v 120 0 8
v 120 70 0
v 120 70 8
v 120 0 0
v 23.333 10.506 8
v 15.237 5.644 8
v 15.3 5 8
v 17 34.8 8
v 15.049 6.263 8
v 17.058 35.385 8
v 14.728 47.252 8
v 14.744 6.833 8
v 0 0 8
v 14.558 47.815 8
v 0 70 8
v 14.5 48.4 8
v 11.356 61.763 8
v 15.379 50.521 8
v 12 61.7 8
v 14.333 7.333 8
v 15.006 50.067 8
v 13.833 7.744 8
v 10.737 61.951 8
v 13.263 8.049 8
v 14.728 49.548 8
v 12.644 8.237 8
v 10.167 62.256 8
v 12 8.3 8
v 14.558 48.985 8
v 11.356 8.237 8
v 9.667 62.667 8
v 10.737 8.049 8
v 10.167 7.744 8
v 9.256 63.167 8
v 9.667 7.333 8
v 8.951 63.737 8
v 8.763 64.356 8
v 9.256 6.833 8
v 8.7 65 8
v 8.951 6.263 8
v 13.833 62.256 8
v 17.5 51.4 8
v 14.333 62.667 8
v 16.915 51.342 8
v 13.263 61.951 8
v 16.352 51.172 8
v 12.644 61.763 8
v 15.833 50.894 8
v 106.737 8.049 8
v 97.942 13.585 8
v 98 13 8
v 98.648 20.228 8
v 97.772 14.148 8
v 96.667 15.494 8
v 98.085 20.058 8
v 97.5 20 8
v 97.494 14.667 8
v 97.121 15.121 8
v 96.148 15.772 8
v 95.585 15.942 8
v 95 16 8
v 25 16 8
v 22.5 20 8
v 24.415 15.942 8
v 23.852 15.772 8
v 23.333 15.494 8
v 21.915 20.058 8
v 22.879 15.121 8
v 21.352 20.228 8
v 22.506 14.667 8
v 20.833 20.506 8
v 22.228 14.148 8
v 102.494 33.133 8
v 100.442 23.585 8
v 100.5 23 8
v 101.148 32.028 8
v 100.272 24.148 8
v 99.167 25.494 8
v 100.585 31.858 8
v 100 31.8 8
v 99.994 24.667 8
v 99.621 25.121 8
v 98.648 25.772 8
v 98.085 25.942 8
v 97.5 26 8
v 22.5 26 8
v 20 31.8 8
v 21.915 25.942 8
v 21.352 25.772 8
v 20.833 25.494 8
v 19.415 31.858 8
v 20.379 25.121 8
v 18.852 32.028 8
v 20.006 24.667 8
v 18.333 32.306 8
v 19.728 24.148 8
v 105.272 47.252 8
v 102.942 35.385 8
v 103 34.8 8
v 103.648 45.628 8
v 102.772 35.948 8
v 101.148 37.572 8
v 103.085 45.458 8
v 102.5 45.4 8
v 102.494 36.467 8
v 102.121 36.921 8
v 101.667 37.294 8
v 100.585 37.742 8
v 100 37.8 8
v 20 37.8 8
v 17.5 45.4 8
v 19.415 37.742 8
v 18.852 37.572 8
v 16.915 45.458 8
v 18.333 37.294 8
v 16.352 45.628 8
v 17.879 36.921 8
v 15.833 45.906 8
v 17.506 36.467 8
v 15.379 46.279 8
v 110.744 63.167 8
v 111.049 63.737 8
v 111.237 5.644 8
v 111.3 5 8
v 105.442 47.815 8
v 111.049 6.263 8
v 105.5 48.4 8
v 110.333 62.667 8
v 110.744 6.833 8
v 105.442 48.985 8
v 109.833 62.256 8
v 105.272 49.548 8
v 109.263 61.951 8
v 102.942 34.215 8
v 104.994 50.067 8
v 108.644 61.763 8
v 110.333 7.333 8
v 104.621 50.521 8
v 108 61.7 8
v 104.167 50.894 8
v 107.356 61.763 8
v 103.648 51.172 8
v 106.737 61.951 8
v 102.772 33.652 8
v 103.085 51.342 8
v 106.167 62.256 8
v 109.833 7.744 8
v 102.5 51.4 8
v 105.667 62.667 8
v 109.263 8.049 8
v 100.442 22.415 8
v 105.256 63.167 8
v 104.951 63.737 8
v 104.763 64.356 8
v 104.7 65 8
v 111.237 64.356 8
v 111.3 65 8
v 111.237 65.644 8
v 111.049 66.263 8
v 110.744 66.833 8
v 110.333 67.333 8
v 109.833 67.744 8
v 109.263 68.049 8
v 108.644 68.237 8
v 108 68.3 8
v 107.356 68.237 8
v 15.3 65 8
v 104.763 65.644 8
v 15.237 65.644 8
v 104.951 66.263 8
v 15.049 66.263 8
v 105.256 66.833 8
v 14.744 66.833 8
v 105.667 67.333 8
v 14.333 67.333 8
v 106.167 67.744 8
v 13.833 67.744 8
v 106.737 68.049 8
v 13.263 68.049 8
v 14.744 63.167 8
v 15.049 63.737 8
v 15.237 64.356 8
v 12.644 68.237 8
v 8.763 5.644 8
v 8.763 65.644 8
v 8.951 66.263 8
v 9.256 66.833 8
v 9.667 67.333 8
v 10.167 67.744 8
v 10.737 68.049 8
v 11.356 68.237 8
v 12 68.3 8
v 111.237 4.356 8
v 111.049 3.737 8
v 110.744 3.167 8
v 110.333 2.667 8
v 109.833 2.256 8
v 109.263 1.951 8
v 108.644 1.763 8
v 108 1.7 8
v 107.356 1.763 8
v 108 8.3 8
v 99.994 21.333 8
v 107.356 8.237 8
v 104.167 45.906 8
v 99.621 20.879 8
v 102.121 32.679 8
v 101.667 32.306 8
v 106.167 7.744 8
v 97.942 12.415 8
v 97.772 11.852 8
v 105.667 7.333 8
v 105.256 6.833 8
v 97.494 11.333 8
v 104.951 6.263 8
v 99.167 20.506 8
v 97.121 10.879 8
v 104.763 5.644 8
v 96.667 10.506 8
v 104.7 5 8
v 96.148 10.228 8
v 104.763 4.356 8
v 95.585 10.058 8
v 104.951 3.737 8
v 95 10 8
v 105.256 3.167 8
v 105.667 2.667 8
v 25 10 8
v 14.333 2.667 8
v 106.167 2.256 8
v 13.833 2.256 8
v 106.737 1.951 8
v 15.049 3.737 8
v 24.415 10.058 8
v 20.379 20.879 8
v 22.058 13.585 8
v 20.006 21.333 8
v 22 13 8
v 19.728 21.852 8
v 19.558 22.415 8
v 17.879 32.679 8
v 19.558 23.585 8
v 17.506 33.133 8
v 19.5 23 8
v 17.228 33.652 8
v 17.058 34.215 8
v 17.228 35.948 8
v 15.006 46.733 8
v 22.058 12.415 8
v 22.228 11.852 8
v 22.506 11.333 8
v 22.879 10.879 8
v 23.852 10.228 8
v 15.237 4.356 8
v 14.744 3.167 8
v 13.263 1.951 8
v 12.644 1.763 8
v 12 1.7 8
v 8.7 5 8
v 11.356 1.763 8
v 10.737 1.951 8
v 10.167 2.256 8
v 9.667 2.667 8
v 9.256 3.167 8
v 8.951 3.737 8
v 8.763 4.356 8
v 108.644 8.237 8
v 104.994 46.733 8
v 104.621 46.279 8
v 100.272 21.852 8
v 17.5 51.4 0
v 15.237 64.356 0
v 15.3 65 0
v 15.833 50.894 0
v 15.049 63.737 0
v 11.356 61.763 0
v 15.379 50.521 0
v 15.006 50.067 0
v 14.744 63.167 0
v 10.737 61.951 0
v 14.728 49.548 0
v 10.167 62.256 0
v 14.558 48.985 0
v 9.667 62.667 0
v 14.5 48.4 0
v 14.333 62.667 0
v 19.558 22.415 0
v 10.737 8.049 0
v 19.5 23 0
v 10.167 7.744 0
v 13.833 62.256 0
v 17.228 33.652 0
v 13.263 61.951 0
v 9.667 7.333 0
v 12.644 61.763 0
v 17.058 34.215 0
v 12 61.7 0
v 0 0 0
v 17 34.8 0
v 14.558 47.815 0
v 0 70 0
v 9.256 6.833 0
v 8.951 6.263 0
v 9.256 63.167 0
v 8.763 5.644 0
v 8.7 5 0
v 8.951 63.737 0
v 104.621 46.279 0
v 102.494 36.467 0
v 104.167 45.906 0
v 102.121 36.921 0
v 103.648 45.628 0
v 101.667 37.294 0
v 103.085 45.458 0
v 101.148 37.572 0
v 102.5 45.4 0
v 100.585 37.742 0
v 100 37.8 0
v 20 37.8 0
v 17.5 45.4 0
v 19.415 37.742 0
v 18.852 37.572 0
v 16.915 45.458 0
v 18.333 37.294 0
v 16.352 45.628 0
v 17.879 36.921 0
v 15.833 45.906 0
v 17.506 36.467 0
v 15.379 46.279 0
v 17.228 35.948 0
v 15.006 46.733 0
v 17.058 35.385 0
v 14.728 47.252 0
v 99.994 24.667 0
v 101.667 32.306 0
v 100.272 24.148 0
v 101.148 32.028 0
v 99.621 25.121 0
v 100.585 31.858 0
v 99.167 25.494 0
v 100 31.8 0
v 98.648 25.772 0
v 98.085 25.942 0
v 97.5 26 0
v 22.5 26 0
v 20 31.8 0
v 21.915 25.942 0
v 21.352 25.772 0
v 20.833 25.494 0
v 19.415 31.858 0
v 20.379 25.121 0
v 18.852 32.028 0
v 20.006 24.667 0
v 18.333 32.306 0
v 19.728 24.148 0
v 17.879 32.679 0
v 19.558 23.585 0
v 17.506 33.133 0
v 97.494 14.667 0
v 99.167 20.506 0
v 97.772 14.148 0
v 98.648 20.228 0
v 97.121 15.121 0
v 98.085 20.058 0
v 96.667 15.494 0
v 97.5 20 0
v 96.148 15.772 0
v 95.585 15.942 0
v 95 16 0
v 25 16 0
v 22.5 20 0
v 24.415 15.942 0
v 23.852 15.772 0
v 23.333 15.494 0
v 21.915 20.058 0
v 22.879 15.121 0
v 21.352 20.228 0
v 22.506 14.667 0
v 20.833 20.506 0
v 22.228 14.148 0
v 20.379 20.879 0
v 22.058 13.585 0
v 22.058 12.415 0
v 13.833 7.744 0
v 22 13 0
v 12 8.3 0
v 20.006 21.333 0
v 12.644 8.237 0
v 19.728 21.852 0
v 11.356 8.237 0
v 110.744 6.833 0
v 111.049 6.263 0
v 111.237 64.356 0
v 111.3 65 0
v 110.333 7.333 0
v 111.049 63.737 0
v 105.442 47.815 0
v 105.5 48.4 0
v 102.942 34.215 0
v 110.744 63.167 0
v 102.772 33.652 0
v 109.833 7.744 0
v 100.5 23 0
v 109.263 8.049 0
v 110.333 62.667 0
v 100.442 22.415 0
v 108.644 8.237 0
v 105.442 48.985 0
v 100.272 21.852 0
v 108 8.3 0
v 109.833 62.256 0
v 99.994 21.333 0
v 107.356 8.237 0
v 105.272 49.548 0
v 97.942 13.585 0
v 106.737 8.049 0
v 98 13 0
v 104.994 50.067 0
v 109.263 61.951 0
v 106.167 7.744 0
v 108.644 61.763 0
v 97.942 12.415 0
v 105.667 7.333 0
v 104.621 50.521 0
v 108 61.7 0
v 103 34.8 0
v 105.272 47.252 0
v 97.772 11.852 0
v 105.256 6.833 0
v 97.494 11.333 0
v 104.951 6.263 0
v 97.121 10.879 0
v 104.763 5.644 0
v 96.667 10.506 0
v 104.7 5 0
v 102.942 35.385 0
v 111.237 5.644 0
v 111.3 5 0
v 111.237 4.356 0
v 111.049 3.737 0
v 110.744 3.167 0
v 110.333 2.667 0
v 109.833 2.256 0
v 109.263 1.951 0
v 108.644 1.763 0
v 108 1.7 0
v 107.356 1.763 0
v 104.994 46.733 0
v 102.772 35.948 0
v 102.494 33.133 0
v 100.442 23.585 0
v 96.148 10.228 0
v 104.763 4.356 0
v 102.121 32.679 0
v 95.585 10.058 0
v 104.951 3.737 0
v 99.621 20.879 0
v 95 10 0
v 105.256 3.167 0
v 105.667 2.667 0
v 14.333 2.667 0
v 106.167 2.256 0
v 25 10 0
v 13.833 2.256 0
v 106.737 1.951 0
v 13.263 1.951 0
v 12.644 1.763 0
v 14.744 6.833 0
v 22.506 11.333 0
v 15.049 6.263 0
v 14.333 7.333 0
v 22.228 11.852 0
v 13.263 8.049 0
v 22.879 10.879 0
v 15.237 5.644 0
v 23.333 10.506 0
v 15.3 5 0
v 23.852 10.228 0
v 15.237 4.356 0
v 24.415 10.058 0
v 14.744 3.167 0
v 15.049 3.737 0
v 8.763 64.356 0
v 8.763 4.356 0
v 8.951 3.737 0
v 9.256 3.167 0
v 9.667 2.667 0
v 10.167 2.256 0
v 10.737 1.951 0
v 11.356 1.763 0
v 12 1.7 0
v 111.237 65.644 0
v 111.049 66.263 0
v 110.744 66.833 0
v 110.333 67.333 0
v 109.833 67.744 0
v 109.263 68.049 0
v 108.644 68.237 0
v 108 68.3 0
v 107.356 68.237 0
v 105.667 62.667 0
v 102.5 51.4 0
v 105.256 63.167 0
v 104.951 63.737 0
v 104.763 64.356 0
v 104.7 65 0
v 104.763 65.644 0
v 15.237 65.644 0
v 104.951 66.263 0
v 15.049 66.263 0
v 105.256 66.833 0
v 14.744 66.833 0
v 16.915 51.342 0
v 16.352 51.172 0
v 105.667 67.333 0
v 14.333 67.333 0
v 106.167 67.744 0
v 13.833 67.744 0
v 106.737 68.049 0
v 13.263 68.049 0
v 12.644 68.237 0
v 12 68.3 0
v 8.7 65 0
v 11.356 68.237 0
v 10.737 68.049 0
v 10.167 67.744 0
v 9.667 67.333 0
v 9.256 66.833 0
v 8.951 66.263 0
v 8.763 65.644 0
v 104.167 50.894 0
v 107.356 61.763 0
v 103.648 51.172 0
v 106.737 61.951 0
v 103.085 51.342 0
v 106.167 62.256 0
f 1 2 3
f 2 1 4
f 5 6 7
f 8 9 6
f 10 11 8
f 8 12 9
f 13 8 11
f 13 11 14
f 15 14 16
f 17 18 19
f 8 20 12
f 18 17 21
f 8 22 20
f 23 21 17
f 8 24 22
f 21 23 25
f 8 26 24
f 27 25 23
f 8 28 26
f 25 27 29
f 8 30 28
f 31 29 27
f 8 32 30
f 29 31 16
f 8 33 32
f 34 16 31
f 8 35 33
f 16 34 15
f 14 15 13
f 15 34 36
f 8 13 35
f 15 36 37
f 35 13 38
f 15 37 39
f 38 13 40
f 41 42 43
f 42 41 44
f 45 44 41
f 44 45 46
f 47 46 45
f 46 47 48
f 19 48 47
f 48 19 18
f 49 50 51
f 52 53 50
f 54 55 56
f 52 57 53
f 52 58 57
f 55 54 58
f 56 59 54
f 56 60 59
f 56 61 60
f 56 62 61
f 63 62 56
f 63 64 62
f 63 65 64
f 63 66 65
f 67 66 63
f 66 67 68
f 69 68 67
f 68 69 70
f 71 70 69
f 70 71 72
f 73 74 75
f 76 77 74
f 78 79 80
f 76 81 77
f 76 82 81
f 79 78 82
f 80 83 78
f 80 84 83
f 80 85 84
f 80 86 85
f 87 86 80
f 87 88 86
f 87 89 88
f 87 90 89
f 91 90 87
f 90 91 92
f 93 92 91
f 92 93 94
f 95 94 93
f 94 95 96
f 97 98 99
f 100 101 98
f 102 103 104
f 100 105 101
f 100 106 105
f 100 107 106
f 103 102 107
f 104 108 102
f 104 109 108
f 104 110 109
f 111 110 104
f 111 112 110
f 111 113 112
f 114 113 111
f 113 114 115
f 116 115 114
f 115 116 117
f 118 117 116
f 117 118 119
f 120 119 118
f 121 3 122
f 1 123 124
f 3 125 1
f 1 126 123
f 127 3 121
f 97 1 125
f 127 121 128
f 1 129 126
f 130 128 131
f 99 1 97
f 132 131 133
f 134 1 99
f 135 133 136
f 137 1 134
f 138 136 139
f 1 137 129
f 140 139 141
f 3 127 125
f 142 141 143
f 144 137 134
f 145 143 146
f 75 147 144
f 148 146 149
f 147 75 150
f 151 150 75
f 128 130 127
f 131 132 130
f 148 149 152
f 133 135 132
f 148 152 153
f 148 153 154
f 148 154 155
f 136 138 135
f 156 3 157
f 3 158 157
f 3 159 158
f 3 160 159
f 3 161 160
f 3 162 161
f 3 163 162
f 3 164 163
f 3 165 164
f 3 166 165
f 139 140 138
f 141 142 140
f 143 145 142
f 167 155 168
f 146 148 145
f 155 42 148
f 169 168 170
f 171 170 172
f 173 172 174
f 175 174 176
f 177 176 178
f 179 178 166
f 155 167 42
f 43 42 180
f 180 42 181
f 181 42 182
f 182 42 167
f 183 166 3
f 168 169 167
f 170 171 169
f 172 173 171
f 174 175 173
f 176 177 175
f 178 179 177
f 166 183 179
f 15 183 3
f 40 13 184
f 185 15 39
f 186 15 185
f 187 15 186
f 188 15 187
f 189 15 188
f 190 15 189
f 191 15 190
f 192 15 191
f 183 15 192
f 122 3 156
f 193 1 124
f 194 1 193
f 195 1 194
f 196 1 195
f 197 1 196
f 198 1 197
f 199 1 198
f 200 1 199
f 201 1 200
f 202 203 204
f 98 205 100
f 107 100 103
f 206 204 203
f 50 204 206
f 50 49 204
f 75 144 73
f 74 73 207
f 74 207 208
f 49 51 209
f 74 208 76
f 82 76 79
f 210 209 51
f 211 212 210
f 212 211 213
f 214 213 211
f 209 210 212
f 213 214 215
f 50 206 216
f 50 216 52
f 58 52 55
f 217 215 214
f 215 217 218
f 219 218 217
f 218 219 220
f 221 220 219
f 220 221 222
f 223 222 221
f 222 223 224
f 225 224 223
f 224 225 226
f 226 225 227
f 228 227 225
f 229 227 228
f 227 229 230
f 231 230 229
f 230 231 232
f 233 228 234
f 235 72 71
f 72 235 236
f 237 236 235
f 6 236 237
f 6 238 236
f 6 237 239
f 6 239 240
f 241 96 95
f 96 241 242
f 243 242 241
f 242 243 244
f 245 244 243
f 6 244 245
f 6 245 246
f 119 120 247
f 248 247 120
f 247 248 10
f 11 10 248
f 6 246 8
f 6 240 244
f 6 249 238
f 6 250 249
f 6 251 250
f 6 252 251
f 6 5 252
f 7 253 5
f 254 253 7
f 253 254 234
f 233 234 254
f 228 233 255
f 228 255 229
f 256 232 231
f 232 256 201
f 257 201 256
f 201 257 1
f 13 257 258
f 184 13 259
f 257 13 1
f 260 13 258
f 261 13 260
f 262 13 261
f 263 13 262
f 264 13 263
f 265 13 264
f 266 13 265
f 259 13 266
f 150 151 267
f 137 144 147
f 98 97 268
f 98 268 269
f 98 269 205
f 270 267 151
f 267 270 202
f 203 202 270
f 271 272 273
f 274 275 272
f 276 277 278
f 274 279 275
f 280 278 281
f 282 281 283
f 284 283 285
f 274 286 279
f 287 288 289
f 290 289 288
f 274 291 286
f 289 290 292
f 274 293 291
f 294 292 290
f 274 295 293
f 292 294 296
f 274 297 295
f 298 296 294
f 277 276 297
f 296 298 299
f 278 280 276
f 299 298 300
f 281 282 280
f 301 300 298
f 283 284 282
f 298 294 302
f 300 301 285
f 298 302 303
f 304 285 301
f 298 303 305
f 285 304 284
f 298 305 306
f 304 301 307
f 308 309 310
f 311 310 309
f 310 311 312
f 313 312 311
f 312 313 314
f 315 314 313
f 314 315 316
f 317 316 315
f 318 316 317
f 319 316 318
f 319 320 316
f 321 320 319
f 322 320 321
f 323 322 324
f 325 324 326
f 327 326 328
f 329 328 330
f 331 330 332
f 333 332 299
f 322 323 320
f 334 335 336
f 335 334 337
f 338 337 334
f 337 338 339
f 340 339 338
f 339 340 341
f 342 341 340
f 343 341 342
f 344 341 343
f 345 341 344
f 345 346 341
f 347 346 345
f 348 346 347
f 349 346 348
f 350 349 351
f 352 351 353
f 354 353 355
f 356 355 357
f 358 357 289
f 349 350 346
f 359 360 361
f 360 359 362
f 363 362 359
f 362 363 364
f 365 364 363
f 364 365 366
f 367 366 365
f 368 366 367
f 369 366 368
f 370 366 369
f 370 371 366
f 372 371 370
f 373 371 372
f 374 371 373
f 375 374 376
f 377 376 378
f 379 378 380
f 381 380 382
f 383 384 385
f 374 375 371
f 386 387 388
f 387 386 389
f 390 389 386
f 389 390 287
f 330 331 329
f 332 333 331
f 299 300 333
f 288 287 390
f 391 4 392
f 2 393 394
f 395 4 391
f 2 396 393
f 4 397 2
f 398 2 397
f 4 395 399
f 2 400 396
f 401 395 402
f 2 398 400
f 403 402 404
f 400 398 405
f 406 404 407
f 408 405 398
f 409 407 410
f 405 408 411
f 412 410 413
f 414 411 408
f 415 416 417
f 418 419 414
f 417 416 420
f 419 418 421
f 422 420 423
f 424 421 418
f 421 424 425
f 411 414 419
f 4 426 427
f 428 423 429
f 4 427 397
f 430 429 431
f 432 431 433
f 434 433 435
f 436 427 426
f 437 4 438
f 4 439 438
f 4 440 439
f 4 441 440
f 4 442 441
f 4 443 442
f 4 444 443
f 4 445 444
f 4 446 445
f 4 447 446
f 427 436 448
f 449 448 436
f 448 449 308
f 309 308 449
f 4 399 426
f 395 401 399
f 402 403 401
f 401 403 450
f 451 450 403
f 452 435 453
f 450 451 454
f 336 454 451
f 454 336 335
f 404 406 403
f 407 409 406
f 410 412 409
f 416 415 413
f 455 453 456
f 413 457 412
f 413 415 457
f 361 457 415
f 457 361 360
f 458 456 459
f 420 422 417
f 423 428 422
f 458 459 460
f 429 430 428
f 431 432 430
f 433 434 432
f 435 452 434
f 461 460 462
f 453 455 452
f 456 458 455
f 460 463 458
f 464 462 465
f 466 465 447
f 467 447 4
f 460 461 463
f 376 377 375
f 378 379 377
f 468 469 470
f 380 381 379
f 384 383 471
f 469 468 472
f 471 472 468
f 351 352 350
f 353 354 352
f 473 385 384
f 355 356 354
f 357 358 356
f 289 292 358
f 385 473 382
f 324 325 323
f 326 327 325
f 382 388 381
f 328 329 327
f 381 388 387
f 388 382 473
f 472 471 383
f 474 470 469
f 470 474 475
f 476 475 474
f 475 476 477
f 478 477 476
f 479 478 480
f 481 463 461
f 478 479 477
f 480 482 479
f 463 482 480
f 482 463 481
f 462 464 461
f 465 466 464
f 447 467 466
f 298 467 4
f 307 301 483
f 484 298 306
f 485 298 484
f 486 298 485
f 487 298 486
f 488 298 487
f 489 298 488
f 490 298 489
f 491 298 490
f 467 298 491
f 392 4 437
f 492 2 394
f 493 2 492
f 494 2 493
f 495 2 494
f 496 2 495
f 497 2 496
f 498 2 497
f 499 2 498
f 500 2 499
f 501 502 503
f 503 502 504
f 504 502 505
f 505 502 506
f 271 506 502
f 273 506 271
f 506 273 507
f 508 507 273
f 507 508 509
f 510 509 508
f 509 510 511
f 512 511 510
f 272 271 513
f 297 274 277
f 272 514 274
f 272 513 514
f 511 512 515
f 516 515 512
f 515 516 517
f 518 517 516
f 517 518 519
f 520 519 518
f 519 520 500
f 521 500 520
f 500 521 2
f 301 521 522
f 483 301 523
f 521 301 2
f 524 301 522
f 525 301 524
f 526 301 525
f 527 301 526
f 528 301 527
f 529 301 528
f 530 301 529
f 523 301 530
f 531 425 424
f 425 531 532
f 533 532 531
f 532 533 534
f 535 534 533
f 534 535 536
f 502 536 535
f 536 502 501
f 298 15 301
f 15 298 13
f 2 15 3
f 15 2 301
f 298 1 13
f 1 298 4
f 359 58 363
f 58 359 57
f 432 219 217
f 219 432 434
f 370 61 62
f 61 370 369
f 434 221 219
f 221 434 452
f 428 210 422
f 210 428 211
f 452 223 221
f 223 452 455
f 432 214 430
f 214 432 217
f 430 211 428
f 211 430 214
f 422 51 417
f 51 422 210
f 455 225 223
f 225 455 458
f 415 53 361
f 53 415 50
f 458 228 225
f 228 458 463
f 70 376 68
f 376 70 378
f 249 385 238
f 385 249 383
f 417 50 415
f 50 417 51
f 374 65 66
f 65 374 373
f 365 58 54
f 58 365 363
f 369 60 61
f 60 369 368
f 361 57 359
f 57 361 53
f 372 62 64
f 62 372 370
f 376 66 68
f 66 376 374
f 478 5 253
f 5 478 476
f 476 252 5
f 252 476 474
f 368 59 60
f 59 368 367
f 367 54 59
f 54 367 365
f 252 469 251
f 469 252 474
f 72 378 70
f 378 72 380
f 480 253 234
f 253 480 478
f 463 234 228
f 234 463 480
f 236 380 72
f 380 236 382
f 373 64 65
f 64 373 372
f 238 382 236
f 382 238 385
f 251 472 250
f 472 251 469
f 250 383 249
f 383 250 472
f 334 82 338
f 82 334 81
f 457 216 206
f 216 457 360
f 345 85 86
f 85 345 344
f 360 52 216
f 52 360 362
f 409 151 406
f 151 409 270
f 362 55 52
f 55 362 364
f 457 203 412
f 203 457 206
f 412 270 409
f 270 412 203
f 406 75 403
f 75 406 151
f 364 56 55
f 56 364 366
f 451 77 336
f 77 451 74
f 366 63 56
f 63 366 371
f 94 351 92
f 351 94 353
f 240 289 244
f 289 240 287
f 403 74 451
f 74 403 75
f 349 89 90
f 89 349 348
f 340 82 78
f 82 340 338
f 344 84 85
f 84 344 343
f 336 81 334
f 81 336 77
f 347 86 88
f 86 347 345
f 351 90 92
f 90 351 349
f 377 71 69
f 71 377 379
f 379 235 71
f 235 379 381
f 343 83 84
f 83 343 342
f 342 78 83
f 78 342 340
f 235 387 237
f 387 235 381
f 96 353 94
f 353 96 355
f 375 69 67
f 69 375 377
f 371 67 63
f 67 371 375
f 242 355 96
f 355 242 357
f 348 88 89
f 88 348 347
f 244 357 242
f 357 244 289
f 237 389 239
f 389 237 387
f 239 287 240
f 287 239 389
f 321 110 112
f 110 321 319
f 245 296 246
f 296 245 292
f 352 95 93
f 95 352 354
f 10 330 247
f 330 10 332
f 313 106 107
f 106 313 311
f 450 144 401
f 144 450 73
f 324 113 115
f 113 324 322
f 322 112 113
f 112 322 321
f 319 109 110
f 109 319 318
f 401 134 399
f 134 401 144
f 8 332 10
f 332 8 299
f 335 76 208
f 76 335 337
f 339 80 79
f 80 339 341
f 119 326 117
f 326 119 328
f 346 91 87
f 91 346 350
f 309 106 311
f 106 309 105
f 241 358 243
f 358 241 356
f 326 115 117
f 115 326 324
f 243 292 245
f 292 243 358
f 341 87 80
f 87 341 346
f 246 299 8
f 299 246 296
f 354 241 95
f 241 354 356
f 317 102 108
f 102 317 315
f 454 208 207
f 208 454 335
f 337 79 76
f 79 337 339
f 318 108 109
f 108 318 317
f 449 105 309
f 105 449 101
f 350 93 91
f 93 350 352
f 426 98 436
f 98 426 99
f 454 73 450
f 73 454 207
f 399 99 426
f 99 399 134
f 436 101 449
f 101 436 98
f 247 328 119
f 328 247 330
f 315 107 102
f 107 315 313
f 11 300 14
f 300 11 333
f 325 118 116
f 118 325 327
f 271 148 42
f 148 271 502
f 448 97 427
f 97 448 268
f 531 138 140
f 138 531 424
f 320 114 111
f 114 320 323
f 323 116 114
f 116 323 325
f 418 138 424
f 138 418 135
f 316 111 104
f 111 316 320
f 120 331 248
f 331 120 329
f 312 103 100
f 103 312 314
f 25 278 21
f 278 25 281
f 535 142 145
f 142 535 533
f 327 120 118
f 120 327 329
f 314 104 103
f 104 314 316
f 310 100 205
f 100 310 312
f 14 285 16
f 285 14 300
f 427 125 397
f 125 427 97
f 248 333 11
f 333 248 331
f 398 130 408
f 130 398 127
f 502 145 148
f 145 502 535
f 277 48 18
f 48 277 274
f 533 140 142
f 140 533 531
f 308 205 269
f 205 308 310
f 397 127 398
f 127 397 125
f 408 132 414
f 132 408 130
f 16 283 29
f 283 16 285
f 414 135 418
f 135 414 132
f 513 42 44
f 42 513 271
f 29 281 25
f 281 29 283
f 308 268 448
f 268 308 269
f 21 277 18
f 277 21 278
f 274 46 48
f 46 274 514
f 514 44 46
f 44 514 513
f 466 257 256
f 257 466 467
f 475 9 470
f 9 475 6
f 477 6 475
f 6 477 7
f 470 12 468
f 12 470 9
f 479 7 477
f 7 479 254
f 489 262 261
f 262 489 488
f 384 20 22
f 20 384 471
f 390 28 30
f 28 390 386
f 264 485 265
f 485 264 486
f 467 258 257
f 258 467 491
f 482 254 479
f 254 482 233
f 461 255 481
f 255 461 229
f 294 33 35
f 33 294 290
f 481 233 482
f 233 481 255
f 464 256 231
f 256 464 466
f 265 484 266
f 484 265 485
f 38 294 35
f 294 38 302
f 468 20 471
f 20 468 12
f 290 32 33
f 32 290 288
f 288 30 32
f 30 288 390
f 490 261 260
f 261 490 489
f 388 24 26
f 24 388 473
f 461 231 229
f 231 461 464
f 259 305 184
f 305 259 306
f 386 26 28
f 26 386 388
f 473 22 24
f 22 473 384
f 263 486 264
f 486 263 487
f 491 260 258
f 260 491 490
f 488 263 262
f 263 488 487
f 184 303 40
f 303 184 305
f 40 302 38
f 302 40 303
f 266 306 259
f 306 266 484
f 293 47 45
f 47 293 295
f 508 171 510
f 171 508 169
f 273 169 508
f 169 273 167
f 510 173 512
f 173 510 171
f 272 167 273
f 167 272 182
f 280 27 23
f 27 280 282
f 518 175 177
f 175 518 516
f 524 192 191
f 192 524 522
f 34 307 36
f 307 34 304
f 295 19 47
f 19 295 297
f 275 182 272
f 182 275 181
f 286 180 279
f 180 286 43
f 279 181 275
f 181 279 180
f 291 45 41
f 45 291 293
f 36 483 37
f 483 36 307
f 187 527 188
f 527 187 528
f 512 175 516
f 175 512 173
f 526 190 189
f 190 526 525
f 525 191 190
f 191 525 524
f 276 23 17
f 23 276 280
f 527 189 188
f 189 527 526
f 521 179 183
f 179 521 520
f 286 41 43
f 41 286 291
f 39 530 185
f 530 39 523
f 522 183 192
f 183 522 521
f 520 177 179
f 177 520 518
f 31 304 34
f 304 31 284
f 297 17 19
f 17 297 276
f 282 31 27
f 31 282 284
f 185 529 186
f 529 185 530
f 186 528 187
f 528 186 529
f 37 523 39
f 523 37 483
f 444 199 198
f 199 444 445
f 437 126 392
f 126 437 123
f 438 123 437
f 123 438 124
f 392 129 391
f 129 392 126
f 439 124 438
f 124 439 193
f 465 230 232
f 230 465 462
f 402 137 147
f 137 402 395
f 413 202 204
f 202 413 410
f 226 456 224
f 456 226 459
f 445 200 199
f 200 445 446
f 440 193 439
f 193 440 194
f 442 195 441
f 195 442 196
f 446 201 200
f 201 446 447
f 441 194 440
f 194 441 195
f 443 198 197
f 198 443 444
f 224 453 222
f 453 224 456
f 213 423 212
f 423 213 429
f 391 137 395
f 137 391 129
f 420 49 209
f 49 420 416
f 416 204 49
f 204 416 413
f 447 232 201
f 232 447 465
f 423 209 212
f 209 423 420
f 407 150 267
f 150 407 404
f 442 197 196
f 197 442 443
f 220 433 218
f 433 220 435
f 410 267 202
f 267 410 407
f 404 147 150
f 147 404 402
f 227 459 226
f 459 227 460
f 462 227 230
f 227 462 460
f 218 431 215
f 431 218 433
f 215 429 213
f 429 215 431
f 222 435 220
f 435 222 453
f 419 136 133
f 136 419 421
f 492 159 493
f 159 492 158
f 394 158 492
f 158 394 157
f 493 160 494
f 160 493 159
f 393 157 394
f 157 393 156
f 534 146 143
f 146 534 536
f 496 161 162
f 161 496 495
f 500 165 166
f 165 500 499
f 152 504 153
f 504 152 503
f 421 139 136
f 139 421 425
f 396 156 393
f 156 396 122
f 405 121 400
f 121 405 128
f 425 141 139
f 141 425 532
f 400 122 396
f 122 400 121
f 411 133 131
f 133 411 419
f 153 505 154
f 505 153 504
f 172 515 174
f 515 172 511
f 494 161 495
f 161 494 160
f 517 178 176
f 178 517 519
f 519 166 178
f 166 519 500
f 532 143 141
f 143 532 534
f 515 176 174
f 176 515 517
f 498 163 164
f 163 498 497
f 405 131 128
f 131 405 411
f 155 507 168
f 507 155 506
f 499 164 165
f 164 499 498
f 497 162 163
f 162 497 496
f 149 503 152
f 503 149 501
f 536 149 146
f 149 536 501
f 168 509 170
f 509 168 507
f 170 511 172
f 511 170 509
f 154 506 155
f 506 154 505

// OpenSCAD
$fn = 32;

// ----------------------------------------------------------------------
// Slotted panel: 120 x 70 mm, 4 ряда of slots
// ----------------------------------------------------------------------

// --- parameters (mm) ---
panel_w = 120;            // panel width
panel_d = 70;             // panel depth
thick = 8;                // panel thickness
slot_w = 6;               // slot width
pitch0 = 10;              // first row pitch
pitch_step = 1.8;         // pitch increase per row
margin = 10;              // margin around the slot field
rows = 4;                 // number of slot rows
mount_d = 6.6;            // mounting holes
mount_x = 48;             // mounting hole offset

difference() {
  union() {
    cube([panel_w, panel_d, thick]);
  }
  /* slot rows: stadium shaped cutters, 2.5 mm clear of both faces */
  /* row 0: pitch 10, length 70 */
  hull() {
    translate([25, 13, -2.5]) cylinder(h = thick + 5, d = slot_w);
    translate([95, 13, -2.5]) cylinder(h = thick + 5, d = slot_w);
  }
  /* row 1: pitch 11.8, length 75 */
  hull() {
    translate([22.5, 23, -2.5]) cylinder(h = thick + 5, d = slot_w);
    translate([97.5, 23, -2.5]) cylinder(h = thick + 5, d = slot_w);
  }
  /* row 2: pitch 13.6, length 80 */
  hull() {
    translate([20, 34.8, -2.5]) cylinder(h = thick + 5, d = slot_w);
    translate([100, 34.8, -2.5]) cylinder(h = thick + 5, d = slot_w);
  }
  /* row 3: pitch 15.4, length 85 */
  hull() {
    translate([17.5, 48.4, -2.5]) cylinder(h = thick + 5, d = slot_w);
    translate([102.5, 48.4, -2.5]) cylinder(h = thick + 5, d = slot_w);
  }
  translate([12, 5, -2.5]) cylinder(h = 13, d = mount_d);
  translate([12, 65, -2.5]) cylinder(h = 13, d = mount_d);
  translate([108, 5, -2.5]) cylinder(h = 13, d = mount_d);
  translate([108, 65, -2.5]) cylinder(h = 13, d = mount_d);
}
